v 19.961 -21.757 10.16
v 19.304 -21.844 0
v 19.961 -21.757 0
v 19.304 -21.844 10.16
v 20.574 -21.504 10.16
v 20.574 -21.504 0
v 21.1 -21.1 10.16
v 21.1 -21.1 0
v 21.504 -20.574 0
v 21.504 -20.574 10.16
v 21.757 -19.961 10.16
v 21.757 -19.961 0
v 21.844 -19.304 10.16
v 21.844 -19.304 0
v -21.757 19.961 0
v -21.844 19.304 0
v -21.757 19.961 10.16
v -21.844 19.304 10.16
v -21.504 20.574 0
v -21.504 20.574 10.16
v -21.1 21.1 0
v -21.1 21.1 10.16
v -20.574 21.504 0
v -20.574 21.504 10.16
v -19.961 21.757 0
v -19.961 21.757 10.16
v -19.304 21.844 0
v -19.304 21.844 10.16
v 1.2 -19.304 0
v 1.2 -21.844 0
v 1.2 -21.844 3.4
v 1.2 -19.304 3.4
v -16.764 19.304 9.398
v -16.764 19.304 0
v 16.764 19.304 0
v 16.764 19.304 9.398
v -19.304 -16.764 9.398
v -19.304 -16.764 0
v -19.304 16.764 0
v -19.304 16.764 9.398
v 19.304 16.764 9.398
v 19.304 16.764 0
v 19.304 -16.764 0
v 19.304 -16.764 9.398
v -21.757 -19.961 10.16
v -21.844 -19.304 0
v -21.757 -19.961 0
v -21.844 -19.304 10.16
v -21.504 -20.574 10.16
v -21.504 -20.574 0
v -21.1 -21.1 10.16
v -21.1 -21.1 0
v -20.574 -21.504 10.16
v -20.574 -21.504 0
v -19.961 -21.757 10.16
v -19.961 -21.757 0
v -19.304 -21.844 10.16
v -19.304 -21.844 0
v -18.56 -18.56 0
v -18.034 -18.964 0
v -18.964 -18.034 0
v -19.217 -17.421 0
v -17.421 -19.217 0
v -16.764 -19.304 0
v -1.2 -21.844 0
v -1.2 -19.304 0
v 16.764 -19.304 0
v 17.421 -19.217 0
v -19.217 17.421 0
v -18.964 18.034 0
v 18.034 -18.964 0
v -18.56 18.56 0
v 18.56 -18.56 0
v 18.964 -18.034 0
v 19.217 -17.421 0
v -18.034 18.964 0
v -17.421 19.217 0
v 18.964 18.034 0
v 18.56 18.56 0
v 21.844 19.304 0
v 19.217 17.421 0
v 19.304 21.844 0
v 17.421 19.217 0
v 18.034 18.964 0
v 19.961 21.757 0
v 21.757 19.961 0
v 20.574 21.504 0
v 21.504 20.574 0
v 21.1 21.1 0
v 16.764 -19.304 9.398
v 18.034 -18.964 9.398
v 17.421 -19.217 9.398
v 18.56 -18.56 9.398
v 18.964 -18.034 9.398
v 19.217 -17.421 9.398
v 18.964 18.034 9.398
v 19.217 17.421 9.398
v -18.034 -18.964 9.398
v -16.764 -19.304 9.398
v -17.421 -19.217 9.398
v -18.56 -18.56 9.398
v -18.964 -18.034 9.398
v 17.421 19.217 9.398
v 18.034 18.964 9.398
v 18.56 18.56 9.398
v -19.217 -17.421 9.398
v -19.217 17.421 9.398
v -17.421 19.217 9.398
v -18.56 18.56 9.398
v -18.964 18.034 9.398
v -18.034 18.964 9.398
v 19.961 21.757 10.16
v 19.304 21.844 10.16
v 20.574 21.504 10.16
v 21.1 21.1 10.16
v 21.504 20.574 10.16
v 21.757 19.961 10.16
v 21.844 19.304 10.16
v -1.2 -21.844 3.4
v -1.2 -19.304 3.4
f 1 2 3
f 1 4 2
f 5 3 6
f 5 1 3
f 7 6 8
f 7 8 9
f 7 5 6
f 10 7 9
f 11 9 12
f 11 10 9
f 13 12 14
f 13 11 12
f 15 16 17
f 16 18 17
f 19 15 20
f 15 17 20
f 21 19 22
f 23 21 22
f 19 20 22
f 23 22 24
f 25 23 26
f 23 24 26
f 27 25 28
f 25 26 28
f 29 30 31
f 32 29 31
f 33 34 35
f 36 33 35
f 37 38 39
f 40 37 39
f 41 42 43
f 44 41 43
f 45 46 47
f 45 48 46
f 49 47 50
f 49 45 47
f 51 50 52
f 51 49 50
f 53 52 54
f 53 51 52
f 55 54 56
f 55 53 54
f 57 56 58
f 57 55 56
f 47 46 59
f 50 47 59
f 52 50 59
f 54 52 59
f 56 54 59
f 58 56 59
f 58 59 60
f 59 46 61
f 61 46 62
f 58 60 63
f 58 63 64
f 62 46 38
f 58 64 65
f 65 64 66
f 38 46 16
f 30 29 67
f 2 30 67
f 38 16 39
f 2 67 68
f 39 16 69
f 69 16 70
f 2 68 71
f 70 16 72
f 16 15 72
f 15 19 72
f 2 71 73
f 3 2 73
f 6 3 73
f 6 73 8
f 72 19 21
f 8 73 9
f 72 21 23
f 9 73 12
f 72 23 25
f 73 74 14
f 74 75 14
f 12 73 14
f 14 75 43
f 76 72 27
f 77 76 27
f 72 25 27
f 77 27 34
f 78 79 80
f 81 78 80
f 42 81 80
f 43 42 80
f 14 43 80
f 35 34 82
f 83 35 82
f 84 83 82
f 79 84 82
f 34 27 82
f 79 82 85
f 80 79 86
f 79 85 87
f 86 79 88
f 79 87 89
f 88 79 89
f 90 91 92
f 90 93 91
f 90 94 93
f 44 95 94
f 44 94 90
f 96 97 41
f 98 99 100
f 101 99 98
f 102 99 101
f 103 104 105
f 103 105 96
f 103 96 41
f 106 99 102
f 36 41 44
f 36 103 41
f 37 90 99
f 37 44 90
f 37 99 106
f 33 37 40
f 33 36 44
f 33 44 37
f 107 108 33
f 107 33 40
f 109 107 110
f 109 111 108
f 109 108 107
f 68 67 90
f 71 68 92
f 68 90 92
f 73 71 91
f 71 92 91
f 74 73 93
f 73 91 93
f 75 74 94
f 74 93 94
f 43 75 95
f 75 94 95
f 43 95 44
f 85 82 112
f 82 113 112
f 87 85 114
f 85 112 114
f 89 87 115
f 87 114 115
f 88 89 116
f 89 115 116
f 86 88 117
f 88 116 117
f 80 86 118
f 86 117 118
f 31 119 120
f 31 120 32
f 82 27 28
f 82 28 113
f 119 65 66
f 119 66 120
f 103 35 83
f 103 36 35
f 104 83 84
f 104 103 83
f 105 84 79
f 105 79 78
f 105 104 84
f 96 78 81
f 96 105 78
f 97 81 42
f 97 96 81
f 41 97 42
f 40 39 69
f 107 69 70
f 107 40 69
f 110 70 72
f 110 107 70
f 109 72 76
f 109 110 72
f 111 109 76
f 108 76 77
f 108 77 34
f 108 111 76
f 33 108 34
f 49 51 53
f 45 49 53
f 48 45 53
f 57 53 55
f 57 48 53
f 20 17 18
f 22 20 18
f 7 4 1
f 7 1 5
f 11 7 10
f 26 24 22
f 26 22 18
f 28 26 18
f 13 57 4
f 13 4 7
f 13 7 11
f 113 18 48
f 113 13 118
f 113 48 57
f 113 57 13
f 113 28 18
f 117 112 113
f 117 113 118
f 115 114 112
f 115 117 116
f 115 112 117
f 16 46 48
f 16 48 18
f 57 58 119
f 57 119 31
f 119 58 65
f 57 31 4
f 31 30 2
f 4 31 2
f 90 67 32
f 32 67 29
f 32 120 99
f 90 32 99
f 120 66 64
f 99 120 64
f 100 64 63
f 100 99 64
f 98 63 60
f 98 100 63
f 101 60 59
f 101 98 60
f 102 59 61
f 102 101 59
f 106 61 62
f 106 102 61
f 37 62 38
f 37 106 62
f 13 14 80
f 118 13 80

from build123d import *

# Parameters (mm, degrees)
BOSS_EXTRUDE1_OUTLINE_W = 43.688
BOSS_EXTRUDE1_OUTLINE_H = 43.688
BOSS_EXTRUDE1_DEPTH     = 10.16
CUT_EXTRUDE2_DEPTH      = 9.398
SKETCH3_W               = 2.4
SKETCH3_H               = 3.4
CUT_EXTRUDE3_DEPTH      = 9.398
FILLET1_R               = 2.54
FILLET2_R               = 2.54


# Read off the part's stored shape, not the designer's step: Boss-Extrude1
with BuildPart() as part:
    # Boss-Extrude1 outline → Boss-Extrude1 (new body)
    with BuildSketch(Plane.XY):
        Rectangle(BOSS_EXTRUDE1_OUTLINE_W, BOSS_EXTRUDE1_OUTLINE_H)
    extrude(amount=BOSS_EXTRUDE1_DEPTH)

    # Sketch4 → Cut-Extrude2 (cut)
    with BuildSketch(Plane(origin=(0, 0, 0), x_dir=(-1, 0, 0), z_dir=(0, 0, -1))):
        Polygon((-19.304, 19.304), (0, 0), (19.304, 19.304), align=None)
        Polygon((-19.304, 19.304), (-19.304, -19.304), (0, 0), align=None)
        Polygon((19.304, 19.304), (0, 0), (19.304, -19.304), align=None)
        Polygon((0, 0), (-19.304, -19.304), (19.304, -19.304), align=None)
    extrude(amount=-CUT_EXTRUDE2_DEPTH, mode=Mode.SUBTRACT)

    # Sketch3 → Cut-Extrude3 (cut)
    with BuildSketch(Plane.XZ.offset(21.844)):
        with Locations((0, 1.7)):
            Rectangle(SKETCH3_W, SKETCH3_H)
    extrude(amount=-CUT_EXTRUDE3_DEPTH, mode=Mode.SUBTRACT)

    # Fillet1
    fillet1_edges = [part.edges().sort_by_distance(p)[0] for p in [
        (21.844, -21.844, 5.08),
        (-21.844, -21.844, 5.08),
        (-21.844, 21.844, 5.08),
        (21.844, 21.844, 5.08),
    ]]
    fillet(fillet1_edges, radius=FILLET1_R)

    # Fillet2
    fillet2_edges = [part.edges().sort_by_distance(p)[0] for p in [
        (19.304, 19.304, 4.699),
        (-19.304, 19.304, 4.699),
        (-19.304, -19.304, 4.699),
        (19.304, -19.304, 4.699),
    ]]
    fillet(fillet2_edges, radius=FILLET2_R)


solid = part.part
